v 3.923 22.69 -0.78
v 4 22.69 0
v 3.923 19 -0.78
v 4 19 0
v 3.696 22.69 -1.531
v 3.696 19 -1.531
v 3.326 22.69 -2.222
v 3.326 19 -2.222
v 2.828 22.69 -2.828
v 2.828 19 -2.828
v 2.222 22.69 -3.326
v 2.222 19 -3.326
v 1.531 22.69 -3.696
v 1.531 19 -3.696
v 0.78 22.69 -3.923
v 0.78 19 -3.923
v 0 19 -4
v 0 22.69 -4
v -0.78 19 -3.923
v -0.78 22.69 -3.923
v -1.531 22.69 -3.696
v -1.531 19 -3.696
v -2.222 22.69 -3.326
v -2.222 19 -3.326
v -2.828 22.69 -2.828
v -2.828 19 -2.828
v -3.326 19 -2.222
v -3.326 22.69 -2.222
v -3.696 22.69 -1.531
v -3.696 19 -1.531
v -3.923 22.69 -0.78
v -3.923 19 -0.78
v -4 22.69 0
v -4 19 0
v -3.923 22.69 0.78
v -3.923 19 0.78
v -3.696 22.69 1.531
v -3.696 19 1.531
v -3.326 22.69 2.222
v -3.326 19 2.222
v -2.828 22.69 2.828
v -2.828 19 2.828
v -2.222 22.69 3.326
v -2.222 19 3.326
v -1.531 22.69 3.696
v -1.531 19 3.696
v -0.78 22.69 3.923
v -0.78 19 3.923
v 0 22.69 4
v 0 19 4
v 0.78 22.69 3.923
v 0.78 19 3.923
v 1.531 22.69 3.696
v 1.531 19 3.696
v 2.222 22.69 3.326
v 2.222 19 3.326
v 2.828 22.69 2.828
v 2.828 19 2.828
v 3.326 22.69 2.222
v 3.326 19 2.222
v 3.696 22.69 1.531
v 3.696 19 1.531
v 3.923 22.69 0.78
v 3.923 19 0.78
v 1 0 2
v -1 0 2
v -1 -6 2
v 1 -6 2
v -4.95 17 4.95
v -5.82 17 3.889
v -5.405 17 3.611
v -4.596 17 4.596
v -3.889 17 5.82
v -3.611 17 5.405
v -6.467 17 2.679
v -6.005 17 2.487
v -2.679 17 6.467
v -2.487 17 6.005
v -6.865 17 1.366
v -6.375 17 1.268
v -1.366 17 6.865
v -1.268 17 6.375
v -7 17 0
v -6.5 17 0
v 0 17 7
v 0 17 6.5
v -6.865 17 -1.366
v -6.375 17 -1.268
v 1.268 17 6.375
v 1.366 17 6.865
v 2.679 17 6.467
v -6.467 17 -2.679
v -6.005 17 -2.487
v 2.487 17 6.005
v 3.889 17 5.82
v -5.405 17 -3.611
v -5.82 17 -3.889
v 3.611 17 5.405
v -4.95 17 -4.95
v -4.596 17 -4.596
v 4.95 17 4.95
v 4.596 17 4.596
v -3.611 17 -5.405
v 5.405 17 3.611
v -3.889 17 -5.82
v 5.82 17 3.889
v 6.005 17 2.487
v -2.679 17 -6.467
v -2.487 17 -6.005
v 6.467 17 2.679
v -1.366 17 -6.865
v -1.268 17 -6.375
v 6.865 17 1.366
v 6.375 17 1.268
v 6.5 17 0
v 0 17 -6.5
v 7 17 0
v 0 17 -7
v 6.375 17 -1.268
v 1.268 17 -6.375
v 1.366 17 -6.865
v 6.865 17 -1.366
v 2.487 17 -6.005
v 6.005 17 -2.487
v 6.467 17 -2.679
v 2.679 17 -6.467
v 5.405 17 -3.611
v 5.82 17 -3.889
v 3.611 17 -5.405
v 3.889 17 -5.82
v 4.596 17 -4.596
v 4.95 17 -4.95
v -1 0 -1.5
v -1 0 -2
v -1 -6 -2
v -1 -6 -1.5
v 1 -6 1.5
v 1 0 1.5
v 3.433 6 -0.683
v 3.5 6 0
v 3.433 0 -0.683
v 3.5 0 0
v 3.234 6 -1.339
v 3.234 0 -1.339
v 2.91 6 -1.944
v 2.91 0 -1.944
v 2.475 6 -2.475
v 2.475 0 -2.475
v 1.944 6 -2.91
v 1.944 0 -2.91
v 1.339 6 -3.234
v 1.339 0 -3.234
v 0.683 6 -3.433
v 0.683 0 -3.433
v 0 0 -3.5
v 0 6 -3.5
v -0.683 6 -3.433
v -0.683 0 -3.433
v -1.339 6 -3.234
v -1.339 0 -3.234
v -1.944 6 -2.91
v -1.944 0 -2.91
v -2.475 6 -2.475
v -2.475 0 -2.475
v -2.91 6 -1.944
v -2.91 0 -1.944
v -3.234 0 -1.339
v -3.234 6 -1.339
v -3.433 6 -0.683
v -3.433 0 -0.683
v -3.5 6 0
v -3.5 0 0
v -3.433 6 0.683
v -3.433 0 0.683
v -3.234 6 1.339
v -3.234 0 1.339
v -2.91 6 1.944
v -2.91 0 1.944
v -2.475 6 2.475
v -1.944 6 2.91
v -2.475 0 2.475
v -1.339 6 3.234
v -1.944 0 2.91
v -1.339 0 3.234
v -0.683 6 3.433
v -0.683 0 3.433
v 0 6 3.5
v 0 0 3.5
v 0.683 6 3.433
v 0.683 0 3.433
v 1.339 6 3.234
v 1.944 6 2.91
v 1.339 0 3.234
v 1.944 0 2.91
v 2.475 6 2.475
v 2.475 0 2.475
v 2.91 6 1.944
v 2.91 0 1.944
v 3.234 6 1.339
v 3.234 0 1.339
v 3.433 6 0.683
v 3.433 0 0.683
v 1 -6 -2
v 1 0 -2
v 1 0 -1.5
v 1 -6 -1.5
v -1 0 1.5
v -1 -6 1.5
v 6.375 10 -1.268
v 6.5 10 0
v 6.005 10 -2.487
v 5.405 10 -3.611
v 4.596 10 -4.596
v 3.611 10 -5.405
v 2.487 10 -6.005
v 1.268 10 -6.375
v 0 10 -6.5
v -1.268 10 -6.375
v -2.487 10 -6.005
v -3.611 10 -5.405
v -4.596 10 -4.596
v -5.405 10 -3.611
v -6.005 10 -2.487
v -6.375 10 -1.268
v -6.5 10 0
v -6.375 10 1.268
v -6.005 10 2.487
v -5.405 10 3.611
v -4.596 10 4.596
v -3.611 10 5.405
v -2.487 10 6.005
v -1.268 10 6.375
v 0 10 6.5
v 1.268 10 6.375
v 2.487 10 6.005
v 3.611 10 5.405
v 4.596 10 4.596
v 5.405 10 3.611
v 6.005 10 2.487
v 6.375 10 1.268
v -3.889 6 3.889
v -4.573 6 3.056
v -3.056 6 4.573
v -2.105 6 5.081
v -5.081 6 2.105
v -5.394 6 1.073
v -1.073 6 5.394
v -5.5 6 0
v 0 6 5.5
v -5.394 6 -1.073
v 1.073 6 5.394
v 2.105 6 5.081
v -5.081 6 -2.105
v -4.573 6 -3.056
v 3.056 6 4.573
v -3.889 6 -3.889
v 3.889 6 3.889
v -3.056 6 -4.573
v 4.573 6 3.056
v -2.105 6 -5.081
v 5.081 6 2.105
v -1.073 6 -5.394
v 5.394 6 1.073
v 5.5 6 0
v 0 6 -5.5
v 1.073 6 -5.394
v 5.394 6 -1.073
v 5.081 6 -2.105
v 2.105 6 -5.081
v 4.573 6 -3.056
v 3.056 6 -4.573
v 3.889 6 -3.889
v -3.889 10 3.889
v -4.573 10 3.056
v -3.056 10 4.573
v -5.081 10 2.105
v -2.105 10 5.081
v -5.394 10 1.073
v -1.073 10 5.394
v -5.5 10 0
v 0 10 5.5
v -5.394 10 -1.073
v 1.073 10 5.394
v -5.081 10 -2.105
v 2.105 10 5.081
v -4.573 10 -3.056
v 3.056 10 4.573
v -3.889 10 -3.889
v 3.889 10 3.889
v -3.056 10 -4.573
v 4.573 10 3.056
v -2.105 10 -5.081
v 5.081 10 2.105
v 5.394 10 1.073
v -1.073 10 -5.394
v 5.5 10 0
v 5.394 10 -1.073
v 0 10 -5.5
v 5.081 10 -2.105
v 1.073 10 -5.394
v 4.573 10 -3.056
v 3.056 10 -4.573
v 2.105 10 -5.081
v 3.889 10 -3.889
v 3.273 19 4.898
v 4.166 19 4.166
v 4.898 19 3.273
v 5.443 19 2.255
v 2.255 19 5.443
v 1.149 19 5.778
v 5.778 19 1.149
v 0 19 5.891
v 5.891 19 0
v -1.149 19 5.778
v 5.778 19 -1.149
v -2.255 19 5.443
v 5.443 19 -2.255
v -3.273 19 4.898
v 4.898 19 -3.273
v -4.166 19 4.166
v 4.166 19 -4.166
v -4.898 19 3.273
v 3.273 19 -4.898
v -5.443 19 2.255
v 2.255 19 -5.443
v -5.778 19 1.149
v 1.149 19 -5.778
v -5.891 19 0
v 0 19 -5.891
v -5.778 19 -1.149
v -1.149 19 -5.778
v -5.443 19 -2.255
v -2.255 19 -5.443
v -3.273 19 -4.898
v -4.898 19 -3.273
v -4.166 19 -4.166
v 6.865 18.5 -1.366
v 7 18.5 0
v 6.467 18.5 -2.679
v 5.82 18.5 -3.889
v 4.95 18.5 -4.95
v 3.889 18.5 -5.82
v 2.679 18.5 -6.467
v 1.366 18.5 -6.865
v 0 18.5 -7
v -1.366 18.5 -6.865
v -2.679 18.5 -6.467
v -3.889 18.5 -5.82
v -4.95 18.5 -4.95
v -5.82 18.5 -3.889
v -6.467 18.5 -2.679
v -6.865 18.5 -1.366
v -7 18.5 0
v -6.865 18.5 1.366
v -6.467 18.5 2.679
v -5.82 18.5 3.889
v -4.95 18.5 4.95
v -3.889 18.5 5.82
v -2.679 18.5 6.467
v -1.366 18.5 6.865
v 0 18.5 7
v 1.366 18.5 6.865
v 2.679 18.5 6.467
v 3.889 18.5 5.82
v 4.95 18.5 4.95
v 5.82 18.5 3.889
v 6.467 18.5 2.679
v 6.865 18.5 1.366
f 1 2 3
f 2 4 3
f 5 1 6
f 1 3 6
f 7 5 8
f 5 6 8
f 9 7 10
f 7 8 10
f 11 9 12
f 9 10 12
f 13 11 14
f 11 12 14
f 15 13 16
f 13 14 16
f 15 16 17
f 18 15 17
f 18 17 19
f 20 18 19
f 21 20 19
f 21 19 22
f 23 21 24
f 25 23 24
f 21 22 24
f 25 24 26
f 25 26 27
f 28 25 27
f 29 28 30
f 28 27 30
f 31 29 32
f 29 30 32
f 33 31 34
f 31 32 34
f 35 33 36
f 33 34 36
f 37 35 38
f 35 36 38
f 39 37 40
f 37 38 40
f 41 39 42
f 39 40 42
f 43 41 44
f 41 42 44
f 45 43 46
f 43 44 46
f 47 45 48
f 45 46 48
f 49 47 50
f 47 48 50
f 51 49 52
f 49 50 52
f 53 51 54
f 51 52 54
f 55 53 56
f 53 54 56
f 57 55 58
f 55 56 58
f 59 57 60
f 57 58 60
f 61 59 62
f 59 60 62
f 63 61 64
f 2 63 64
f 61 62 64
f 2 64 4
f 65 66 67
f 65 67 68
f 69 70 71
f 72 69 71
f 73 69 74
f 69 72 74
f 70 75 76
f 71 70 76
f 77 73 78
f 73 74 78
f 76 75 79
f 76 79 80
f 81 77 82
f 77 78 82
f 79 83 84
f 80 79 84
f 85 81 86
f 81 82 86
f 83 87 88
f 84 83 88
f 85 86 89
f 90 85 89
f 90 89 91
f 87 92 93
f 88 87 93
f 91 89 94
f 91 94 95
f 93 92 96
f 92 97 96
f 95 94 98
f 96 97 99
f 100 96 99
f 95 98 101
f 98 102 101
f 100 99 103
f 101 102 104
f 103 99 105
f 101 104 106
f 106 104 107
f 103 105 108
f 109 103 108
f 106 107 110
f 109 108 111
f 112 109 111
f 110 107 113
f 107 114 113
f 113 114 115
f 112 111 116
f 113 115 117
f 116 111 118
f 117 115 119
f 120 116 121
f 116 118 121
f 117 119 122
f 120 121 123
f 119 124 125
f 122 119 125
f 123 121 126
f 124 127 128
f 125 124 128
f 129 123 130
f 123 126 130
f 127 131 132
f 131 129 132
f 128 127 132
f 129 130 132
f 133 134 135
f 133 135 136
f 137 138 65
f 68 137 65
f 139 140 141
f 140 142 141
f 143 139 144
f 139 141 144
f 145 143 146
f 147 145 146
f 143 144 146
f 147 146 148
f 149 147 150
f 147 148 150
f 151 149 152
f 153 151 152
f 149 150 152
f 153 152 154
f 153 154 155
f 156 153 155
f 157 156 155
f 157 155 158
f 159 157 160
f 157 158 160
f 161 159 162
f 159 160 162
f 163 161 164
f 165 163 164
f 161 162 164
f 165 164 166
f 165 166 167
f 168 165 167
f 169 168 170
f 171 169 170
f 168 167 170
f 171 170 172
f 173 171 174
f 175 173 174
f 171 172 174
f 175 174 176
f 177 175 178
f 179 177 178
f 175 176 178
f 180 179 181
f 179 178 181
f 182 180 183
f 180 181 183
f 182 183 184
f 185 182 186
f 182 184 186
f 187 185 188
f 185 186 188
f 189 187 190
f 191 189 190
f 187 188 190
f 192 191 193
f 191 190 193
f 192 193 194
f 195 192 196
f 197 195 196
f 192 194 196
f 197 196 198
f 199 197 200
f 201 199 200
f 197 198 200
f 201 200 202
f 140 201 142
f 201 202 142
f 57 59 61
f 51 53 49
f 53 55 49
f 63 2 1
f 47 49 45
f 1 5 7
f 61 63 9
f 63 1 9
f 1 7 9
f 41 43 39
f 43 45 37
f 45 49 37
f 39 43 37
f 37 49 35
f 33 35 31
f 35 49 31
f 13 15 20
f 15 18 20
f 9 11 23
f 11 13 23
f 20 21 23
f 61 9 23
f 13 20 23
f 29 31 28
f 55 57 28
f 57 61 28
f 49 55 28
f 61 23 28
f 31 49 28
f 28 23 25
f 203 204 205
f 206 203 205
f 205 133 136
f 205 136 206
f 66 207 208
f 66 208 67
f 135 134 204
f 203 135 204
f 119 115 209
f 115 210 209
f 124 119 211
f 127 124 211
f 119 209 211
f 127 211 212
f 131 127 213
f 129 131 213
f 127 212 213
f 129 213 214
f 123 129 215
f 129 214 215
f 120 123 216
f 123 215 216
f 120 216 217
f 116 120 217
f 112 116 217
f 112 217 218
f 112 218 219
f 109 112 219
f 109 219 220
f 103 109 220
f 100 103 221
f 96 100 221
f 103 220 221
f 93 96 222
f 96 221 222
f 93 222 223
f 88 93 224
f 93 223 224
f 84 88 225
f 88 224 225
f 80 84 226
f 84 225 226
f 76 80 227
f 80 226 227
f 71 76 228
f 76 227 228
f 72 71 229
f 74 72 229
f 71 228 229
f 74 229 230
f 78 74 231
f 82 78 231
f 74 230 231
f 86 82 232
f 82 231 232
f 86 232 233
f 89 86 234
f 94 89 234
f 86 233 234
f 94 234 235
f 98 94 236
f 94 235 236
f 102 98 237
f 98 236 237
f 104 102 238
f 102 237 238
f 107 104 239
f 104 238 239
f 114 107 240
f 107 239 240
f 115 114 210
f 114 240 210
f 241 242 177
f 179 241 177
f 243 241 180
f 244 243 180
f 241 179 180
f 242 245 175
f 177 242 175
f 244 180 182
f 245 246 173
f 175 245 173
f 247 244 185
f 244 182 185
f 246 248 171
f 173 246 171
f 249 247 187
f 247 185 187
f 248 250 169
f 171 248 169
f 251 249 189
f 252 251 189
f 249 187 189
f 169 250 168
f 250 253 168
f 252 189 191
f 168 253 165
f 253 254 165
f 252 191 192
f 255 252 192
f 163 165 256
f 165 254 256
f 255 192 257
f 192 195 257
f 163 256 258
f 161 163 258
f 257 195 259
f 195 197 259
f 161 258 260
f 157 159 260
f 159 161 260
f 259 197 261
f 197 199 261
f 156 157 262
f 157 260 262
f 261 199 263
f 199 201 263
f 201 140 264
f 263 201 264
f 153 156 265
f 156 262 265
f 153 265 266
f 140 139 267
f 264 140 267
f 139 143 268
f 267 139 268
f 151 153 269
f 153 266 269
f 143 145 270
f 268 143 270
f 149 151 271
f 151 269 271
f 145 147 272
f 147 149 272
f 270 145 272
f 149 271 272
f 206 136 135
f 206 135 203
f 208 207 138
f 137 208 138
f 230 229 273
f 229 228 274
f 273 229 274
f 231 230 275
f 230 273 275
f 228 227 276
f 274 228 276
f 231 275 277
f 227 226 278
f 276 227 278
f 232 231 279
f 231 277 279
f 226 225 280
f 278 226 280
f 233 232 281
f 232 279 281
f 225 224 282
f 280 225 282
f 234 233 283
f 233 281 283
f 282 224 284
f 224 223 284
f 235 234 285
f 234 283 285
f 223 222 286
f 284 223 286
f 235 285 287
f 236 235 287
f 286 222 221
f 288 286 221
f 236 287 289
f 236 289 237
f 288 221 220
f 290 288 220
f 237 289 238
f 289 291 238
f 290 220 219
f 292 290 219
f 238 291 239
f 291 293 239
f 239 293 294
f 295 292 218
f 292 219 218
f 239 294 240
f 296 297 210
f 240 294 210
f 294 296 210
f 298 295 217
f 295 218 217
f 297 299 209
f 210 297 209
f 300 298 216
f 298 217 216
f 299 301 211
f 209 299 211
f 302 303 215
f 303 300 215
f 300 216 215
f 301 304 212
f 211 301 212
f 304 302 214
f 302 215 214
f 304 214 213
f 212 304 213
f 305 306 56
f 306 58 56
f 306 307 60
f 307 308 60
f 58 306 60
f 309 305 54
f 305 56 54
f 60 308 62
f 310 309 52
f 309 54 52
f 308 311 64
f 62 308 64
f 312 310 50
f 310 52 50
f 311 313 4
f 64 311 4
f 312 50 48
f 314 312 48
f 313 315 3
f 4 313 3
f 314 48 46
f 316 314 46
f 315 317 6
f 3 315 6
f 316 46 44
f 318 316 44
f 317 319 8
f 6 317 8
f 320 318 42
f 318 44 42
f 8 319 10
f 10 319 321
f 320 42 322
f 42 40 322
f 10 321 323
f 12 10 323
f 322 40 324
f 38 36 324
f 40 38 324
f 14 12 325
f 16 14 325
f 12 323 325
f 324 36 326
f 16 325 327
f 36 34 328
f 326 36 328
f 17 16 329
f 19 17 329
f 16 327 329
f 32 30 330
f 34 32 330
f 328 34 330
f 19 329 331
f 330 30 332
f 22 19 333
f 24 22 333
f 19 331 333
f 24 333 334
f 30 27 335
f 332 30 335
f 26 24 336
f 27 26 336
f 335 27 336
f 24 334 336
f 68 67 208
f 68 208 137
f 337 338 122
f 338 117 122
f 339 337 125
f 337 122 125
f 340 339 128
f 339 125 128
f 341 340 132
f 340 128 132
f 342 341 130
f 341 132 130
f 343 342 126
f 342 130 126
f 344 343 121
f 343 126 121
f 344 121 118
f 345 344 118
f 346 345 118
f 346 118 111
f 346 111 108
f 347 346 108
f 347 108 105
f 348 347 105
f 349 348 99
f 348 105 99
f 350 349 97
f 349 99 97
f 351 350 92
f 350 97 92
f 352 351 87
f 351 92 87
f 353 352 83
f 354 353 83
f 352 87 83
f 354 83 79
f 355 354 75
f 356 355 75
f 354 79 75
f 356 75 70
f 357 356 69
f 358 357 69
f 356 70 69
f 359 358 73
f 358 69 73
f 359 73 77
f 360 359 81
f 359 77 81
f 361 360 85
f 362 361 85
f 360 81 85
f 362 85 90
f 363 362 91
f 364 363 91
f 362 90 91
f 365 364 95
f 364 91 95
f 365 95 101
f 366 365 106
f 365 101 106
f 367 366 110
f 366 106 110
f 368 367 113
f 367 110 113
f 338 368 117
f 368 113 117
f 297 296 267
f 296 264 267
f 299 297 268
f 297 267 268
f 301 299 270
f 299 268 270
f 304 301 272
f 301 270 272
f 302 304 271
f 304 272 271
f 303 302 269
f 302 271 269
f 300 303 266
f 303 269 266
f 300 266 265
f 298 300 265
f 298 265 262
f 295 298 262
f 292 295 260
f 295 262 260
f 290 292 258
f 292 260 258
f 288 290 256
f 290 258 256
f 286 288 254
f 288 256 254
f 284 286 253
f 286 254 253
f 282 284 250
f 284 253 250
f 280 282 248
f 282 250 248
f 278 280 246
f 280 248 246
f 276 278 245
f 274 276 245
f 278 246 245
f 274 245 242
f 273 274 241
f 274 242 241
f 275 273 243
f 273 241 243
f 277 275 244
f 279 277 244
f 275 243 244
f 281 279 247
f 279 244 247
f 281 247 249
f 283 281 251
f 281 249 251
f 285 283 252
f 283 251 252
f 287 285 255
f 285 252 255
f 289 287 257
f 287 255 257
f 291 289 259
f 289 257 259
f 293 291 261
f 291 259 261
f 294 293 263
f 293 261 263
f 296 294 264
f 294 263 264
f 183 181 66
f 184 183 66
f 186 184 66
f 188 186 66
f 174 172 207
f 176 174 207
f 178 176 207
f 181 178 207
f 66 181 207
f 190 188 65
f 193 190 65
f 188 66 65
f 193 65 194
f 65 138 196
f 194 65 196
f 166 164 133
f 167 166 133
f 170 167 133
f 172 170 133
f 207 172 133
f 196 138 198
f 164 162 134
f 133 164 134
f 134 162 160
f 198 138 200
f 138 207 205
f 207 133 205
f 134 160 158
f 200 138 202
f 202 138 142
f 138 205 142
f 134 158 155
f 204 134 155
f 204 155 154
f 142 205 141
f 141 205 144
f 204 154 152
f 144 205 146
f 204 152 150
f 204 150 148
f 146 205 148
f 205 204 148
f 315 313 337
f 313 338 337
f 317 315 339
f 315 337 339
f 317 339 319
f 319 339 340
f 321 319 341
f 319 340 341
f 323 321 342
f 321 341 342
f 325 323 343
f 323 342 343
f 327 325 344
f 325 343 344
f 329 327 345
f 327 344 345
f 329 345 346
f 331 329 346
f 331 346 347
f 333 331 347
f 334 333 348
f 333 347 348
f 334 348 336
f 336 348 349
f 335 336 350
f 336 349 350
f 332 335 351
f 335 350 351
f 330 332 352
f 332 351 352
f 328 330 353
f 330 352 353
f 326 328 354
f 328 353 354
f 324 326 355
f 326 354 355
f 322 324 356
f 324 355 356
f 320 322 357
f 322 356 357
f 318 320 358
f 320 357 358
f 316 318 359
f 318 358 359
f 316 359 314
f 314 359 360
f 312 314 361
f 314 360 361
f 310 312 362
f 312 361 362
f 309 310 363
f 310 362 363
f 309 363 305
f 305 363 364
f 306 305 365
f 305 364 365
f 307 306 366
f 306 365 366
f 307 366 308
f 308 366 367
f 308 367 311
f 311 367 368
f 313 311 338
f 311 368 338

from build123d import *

# Parameters (mm, degrees)
ESBO_O2_W                = 2
ESBO_O2_H                = 0.5
RESSALTO_EXTRUS_O1_DEPTH = 6


with BuildPart() as part:
    # Esboço1 → Revolução1 (revolve)
    with BuildSketch(Plane.XY):
        Polygon((0, 22.689764513), (4, 22.689764513), (4, 19), (5.891304348, 19), (7, 18.5), (7, 17), (6.5, 17), (6.5, 10), (5.5, 10), (5.5, 6), (3.5, 6), (3.5, 0), (0, 0), align=None)
    revolve(axis=Axis((0, 0, 0), (0, 1, 0)))

    # Esboço2 → Ressalto-extrusão1 (add)
    with BuildSketch(Plane.XZ):
        with Locations((0, -1.75)):
            Rectangle(ESBO_O2_W, ESBO_O2_H)
        with Locations((0, 1.75)):
            Rectangle(ESBO_O2_W, ESBO_O2_H)
    extrude(amount=RESSALTO_EXTRUS_O1_DEPTH)


solid = part.part
